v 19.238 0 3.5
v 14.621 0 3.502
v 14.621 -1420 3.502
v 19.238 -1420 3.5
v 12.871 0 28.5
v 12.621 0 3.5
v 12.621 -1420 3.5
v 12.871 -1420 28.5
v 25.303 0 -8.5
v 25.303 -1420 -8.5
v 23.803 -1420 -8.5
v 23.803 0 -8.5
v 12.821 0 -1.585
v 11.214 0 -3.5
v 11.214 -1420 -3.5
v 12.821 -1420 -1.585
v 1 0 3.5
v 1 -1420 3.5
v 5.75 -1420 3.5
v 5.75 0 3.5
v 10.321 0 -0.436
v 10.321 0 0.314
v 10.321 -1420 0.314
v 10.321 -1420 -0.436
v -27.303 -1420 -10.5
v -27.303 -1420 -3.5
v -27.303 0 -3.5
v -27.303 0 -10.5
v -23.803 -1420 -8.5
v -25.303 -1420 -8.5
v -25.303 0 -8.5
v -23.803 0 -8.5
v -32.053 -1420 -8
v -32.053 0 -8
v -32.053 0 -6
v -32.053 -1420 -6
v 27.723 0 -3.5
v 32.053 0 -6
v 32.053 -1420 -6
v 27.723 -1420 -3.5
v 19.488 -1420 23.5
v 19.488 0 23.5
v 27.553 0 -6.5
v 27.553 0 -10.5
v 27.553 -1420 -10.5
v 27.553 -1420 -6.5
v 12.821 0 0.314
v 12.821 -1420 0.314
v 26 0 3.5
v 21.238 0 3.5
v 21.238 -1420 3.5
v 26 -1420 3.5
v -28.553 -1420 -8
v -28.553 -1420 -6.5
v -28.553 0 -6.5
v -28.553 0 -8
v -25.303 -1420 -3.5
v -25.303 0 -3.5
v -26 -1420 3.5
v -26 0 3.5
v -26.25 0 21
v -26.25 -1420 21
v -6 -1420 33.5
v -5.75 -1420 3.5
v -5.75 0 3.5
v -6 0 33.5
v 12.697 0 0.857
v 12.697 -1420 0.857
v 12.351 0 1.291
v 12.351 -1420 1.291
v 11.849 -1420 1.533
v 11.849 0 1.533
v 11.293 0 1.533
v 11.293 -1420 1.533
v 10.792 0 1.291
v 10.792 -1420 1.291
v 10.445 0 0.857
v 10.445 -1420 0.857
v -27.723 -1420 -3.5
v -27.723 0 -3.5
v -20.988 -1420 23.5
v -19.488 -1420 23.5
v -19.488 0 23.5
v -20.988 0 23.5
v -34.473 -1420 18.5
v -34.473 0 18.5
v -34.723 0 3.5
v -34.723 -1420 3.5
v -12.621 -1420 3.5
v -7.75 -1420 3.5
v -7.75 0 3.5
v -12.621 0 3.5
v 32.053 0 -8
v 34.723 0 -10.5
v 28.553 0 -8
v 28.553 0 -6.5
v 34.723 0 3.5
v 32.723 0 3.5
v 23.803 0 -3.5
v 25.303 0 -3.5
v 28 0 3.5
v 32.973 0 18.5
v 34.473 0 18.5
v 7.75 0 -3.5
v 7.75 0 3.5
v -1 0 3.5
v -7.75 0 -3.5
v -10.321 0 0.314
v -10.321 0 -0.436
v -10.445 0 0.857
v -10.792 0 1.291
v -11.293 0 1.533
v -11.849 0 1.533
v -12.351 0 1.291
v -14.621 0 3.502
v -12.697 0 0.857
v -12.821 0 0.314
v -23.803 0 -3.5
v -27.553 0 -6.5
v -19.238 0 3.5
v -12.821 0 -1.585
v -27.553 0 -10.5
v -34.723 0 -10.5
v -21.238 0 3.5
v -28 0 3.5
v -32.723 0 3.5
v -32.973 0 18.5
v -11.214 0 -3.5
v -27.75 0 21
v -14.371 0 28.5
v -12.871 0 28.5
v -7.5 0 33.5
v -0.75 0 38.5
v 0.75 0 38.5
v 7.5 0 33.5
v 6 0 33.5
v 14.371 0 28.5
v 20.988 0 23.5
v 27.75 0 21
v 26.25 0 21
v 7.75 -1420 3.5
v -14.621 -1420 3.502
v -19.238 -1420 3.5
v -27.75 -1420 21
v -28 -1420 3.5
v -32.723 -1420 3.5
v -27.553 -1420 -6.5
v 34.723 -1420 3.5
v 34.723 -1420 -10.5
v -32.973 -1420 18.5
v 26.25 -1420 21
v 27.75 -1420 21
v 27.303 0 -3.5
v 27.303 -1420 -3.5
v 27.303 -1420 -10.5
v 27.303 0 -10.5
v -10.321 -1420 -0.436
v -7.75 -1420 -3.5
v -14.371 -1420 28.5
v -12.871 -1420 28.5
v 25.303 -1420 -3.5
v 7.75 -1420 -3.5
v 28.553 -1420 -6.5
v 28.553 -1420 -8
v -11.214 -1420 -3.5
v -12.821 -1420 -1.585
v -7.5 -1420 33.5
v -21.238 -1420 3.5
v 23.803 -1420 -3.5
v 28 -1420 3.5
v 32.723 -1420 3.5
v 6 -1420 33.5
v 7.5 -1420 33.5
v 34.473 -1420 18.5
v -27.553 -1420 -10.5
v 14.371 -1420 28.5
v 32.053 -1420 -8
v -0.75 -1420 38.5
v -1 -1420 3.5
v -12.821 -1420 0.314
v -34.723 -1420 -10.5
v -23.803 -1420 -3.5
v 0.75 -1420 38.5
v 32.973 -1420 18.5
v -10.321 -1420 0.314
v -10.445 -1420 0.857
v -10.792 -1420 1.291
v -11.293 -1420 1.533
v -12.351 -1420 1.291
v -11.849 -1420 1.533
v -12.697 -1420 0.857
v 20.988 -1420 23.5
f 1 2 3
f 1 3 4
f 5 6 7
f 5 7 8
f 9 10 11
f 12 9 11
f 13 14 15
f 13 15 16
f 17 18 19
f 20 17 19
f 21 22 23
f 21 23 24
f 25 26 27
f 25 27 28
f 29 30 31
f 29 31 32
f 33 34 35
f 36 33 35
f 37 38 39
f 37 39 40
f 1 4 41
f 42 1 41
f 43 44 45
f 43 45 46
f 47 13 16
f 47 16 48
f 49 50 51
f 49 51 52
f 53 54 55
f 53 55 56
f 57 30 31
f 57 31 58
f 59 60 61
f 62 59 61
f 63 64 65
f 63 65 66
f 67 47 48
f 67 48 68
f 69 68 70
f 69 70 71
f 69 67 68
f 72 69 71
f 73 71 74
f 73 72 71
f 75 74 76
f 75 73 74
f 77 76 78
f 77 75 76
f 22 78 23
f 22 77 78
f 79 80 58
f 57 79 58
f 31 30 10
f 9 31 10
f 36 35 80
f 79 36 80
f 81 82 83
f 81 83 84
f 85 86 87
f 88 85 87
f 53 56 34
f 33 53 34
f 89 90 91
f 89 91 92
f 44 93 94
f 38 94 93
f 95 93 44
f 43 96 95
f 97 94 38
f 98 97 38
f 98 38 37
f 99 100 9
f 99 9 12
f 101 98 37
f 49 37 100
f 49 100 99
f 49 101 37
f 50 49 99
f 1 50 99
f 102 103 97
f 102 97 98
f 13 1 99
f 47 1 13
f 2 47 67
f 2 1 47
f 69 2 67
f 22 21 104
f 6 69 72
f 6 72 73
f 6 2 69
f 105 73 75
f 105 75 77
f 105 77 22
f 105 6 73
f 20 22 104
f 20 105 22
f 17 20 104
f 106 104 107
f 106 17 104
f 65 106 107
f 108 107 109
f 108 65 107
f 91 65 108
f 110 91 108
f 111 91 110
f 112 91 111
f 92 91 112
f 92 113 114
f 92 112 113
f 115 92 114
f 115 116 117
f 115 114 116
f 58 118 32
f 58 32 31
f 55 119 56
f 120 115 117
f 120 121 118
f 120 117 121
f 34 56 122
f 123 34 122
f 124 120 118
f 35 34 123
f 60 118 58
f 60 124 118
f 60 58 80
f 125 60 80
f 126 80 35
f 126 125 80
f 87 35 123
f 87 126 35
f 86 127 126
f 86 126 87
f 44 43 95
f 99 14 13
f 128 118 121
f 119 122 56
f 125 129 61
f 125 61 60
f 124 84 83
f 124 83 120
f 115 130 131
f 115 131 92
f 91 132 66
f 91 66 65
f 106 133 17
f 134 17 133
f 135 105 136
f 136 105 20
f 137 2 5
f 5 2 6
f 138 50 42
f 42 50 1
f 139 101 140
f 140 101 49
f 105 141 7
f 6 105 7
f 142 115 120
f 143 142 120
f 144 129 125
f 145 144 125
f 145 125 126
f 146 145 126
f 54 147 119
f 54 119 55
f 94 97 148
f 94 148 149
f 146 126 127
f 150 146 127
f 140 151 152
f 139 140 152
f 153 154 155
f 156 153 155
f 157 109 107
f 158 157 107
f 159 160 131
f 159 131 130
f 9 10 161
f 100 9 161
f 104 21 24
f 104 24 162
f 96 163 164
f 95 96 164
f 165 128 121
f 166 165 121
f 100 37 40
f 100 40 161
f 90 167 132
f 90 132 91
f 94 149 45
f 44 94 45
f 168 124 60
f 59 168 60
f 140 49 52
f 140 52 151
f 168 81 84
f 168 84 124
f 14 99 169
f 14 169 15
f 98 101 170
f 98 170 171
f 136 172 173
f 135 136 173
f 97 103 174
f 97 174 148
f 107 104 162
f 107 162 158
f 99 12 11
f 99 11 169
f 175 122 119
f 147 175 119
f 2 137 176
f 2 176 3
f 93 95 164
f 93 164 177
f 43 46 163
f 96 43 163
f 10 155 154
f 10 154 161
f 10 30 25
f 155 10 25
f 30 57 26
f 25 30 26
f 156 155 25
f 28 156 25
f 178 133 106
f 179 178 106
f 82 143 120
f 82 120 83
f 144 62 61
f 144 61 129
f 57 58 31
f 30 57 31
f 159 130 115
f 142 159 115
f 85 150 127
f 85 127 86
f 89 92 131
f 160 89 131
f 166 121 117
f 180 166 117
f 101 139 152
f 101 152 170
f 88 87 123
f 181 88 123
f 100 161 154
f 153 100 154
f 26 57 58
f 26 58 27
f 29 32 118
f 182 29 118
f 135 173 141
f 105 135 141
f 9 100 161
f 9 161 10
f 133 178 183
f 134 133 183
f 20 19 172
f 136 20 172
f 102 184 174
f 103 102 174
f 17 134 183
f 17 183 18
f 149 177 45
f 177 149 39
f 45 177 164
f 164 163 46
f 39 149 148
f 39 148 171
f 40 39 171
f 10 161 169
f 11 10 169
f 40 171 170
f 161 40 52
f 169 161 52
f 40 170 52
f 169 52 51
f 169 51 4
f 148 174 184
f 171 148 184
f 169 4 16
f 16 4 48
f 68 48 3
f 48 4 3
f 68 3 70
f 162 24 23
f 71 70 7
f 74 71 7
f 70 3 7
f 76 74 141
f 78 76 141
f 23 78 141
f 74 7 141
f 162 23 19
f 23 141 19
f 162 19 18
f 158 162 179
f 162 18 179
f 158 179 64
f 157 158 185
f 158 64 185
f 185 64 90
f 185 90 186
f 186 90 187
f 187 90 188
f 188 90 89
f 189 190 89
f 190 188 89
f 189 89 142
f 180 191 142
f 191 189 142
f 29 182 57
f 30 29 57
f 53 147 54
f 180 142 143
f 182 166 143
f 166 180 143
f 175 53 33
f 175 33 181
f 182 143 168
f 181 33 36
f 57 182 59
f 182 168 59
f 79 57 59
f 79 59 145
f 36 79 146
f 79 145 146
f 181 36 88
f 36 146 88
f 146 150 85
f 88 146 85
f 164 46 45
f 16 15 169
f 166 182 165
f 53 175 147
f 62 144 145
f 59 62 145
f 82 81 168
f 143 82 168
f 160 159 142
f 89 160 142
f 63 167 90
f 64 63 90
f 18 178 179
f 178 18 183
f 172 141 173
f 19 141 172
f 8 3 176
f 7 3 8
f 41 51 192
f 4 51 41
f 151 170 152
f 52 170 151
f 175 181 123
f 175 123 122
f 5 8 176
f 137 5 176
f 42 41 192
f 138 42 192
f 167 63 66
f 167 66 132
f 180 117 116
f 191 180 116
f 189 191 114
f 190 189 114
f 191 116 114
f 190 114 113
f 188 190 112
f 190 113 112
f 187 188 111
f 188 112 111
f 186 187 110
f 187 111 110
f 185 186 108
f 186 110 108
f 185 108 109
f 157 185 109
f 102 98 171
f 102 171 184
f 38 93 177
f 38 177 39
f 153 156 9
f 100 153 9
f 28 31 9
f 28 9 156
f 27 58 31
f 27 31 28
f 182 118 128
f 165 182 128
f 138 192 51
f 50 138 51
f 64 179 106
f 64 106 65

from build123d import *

# Parameters (mm, degrees)
F1_DEPTH = 1420
F3_DEPTH = 1420


with BuildPart() as f1:
    # F0 (on Front) → F1 (new body)
    with BuildSketch(Plane.XZ):
        with BuildLine():
            Line((-32.7227568555, 3.4999999998), (-32.9727568555, 18.4999999998))
            Line((-32.9727568555, 18.4999999998), (-34.4727568555, 18.4999999998))
            Line((-34.4727568555, 18.4999999998), (-34.7227568555, 3.4999999998))
            Line((-34.7227568555, 3.4999999998), (-34.7227568555, -10.5000000002))
            Line((-34.7227568555, -10.5000000002), (-27.5528838745, -10.5000000002))
            Line((-27.5528838745, -10.5000000002), (-27.5528838745, -6.5000000002))
            Line((-27.5528838745, -6.5000000002), (-28.5528838745, -6.5000000002))
            Line((-28.5528838745, -6.5000000002), (-28.5528838745, -8.0000000002))
            Line((-28.5528838745, -8.0000000002), (-32.0528838745, -8.0000000002))
            Line((-32.0528838745, -8.0000000002), (-32.0528838745, -6.0000000002))
            Line((-32.0528838745, -6.0000000002), (-27.7227568555, -3.5000000002))
            Line((-27.7227568555, -3.5000000002), (-27.1091535687, -3.5000000002))
            Line((-27.1091535687, -3.5000000002), (-25.3028838745, -3.5000000002))
            Line((-25.3028838745, -3.5000000002), (-25.3028838745, -8.5000000002))
            Line((-25.3028838745, -8.5000000002), (-23.8028838745, -8.5000000002))
            Line((-23.8028838745, -8.5000000002), (-23.8028838745, -3.5000000002))
            Line((-23.8028838745, -3.5000000002), (-11.2141814145, -3.5000000002))
            Line((-11.2141814145, -3.5000000002), (-12.8211504387, -1.5848888924))
            Line((-12.8211504387, -1.5848888924), (-12.8211504387, 0.3141777723))
            ThreePointArc((-12.8211504387, 0.3141777723), (-11.5711504387, 1.5641777723), (-10.3211504387, 0.3141777723))
            Line((-10.3211504387, 0.3141777723), (-10.3211504387, -0.4358222277))
            Line((-10.3211504387, -0.4358222277), (-7.75, -3.5000000002))
            Line((-7.75, -3.5000000002), (0, -3.5000000002))
            Line((0, -3.5000000002), (0, 38.4999999998))
            Line((0, 38.4999999998), (-0.75, 38.4999999998))
            Line((-0.75, 38.4999999998), (-1, 3.4999999998))
            Line((-1, 3.4999999998), (-5.75, 3.4999999998))
            Line((-5.75, 3.4999999998), (-6, 33.4999999998))
            Line((-6, 33.4999999998), (-7.5, 33.4999999998))
            Line((-7.5, 33.4999999998), (-7.75, 3.4999999998))
            Line((-7.75, 3.4999999998), (-12.6212390675, 3.4999999998))
            Line((-12.6212390675, 3.4999999998), (-12.8712390675, 28.4999999998))
            Line((-12.8712390675, 28.4999999998), (-14.3712390675, 28.4999999998))
            Line((-14.3712390675, 28.4999999998), (-14.6212390675, 3.5015064141))
            Line((-14.6212390675, 3.5015064141), (-19.2384126596, 3.4999999998))
            Line((-19.2384126596, 3.4999999998), (-19.4884126596, 23.4999999998))
            Line((-19.4884126596, 23.4999999998), (-20.9884126596, 23.4999999998))
            Line((-20.9884126596, 23.4999999998), (-21.2384126596, 3.4999999998))
            Line((-21.2384126596, 3.4999999998), (-26, 3.4999999998))
            Line((-26, 3.4999999998), (-26.25, 20.9999999998))
            Line((-26.25, 20.9999999998), (-27.75, 20.9999999998))
            Line((-27.75, 20.9999999998), (-28, 3.4999999998))
            Line((-28, 3.4999999998), (-32.7227568555, 3.4999999998))
        make_face()
    extrude(amount=F1_DEPTH)

    # F4: F1 across face


with BuildPart() as f3:
    # F2 (on face) → F3 (new body)
    with BuildSketch(Plane.XZ.offset(1420)):
        Polygon((-25.3028838745, -8.5000000002), (-25.3028838745, -3.5000000002), (-27.3028838745, -3.5000000002), (-27.3028838745, -10.5000000002), (0, -10.5000000002), (0, -8.5000000002), align=None)
    extrude(amount=-F3_DEPTH)

    # F5: F3 across face


with BuildPart() as f1_1:
    add(f1.part)
    add(f1.part.mirror(Plane(origin=(0, -710, 17.4999999998), x_dir=(0, 1, 0), z_dir=(1, 0, 0))))


with BuildPart() as f3_1:
    add(f3.part)
    add(f3.part.mirror(Plane(origin=(0, -710, -9.5000000002), x_dir=(0, 1, 0), z_dir=(1, 0, 0))))


solid = Compound([f1_1.part, f3_1.part])
